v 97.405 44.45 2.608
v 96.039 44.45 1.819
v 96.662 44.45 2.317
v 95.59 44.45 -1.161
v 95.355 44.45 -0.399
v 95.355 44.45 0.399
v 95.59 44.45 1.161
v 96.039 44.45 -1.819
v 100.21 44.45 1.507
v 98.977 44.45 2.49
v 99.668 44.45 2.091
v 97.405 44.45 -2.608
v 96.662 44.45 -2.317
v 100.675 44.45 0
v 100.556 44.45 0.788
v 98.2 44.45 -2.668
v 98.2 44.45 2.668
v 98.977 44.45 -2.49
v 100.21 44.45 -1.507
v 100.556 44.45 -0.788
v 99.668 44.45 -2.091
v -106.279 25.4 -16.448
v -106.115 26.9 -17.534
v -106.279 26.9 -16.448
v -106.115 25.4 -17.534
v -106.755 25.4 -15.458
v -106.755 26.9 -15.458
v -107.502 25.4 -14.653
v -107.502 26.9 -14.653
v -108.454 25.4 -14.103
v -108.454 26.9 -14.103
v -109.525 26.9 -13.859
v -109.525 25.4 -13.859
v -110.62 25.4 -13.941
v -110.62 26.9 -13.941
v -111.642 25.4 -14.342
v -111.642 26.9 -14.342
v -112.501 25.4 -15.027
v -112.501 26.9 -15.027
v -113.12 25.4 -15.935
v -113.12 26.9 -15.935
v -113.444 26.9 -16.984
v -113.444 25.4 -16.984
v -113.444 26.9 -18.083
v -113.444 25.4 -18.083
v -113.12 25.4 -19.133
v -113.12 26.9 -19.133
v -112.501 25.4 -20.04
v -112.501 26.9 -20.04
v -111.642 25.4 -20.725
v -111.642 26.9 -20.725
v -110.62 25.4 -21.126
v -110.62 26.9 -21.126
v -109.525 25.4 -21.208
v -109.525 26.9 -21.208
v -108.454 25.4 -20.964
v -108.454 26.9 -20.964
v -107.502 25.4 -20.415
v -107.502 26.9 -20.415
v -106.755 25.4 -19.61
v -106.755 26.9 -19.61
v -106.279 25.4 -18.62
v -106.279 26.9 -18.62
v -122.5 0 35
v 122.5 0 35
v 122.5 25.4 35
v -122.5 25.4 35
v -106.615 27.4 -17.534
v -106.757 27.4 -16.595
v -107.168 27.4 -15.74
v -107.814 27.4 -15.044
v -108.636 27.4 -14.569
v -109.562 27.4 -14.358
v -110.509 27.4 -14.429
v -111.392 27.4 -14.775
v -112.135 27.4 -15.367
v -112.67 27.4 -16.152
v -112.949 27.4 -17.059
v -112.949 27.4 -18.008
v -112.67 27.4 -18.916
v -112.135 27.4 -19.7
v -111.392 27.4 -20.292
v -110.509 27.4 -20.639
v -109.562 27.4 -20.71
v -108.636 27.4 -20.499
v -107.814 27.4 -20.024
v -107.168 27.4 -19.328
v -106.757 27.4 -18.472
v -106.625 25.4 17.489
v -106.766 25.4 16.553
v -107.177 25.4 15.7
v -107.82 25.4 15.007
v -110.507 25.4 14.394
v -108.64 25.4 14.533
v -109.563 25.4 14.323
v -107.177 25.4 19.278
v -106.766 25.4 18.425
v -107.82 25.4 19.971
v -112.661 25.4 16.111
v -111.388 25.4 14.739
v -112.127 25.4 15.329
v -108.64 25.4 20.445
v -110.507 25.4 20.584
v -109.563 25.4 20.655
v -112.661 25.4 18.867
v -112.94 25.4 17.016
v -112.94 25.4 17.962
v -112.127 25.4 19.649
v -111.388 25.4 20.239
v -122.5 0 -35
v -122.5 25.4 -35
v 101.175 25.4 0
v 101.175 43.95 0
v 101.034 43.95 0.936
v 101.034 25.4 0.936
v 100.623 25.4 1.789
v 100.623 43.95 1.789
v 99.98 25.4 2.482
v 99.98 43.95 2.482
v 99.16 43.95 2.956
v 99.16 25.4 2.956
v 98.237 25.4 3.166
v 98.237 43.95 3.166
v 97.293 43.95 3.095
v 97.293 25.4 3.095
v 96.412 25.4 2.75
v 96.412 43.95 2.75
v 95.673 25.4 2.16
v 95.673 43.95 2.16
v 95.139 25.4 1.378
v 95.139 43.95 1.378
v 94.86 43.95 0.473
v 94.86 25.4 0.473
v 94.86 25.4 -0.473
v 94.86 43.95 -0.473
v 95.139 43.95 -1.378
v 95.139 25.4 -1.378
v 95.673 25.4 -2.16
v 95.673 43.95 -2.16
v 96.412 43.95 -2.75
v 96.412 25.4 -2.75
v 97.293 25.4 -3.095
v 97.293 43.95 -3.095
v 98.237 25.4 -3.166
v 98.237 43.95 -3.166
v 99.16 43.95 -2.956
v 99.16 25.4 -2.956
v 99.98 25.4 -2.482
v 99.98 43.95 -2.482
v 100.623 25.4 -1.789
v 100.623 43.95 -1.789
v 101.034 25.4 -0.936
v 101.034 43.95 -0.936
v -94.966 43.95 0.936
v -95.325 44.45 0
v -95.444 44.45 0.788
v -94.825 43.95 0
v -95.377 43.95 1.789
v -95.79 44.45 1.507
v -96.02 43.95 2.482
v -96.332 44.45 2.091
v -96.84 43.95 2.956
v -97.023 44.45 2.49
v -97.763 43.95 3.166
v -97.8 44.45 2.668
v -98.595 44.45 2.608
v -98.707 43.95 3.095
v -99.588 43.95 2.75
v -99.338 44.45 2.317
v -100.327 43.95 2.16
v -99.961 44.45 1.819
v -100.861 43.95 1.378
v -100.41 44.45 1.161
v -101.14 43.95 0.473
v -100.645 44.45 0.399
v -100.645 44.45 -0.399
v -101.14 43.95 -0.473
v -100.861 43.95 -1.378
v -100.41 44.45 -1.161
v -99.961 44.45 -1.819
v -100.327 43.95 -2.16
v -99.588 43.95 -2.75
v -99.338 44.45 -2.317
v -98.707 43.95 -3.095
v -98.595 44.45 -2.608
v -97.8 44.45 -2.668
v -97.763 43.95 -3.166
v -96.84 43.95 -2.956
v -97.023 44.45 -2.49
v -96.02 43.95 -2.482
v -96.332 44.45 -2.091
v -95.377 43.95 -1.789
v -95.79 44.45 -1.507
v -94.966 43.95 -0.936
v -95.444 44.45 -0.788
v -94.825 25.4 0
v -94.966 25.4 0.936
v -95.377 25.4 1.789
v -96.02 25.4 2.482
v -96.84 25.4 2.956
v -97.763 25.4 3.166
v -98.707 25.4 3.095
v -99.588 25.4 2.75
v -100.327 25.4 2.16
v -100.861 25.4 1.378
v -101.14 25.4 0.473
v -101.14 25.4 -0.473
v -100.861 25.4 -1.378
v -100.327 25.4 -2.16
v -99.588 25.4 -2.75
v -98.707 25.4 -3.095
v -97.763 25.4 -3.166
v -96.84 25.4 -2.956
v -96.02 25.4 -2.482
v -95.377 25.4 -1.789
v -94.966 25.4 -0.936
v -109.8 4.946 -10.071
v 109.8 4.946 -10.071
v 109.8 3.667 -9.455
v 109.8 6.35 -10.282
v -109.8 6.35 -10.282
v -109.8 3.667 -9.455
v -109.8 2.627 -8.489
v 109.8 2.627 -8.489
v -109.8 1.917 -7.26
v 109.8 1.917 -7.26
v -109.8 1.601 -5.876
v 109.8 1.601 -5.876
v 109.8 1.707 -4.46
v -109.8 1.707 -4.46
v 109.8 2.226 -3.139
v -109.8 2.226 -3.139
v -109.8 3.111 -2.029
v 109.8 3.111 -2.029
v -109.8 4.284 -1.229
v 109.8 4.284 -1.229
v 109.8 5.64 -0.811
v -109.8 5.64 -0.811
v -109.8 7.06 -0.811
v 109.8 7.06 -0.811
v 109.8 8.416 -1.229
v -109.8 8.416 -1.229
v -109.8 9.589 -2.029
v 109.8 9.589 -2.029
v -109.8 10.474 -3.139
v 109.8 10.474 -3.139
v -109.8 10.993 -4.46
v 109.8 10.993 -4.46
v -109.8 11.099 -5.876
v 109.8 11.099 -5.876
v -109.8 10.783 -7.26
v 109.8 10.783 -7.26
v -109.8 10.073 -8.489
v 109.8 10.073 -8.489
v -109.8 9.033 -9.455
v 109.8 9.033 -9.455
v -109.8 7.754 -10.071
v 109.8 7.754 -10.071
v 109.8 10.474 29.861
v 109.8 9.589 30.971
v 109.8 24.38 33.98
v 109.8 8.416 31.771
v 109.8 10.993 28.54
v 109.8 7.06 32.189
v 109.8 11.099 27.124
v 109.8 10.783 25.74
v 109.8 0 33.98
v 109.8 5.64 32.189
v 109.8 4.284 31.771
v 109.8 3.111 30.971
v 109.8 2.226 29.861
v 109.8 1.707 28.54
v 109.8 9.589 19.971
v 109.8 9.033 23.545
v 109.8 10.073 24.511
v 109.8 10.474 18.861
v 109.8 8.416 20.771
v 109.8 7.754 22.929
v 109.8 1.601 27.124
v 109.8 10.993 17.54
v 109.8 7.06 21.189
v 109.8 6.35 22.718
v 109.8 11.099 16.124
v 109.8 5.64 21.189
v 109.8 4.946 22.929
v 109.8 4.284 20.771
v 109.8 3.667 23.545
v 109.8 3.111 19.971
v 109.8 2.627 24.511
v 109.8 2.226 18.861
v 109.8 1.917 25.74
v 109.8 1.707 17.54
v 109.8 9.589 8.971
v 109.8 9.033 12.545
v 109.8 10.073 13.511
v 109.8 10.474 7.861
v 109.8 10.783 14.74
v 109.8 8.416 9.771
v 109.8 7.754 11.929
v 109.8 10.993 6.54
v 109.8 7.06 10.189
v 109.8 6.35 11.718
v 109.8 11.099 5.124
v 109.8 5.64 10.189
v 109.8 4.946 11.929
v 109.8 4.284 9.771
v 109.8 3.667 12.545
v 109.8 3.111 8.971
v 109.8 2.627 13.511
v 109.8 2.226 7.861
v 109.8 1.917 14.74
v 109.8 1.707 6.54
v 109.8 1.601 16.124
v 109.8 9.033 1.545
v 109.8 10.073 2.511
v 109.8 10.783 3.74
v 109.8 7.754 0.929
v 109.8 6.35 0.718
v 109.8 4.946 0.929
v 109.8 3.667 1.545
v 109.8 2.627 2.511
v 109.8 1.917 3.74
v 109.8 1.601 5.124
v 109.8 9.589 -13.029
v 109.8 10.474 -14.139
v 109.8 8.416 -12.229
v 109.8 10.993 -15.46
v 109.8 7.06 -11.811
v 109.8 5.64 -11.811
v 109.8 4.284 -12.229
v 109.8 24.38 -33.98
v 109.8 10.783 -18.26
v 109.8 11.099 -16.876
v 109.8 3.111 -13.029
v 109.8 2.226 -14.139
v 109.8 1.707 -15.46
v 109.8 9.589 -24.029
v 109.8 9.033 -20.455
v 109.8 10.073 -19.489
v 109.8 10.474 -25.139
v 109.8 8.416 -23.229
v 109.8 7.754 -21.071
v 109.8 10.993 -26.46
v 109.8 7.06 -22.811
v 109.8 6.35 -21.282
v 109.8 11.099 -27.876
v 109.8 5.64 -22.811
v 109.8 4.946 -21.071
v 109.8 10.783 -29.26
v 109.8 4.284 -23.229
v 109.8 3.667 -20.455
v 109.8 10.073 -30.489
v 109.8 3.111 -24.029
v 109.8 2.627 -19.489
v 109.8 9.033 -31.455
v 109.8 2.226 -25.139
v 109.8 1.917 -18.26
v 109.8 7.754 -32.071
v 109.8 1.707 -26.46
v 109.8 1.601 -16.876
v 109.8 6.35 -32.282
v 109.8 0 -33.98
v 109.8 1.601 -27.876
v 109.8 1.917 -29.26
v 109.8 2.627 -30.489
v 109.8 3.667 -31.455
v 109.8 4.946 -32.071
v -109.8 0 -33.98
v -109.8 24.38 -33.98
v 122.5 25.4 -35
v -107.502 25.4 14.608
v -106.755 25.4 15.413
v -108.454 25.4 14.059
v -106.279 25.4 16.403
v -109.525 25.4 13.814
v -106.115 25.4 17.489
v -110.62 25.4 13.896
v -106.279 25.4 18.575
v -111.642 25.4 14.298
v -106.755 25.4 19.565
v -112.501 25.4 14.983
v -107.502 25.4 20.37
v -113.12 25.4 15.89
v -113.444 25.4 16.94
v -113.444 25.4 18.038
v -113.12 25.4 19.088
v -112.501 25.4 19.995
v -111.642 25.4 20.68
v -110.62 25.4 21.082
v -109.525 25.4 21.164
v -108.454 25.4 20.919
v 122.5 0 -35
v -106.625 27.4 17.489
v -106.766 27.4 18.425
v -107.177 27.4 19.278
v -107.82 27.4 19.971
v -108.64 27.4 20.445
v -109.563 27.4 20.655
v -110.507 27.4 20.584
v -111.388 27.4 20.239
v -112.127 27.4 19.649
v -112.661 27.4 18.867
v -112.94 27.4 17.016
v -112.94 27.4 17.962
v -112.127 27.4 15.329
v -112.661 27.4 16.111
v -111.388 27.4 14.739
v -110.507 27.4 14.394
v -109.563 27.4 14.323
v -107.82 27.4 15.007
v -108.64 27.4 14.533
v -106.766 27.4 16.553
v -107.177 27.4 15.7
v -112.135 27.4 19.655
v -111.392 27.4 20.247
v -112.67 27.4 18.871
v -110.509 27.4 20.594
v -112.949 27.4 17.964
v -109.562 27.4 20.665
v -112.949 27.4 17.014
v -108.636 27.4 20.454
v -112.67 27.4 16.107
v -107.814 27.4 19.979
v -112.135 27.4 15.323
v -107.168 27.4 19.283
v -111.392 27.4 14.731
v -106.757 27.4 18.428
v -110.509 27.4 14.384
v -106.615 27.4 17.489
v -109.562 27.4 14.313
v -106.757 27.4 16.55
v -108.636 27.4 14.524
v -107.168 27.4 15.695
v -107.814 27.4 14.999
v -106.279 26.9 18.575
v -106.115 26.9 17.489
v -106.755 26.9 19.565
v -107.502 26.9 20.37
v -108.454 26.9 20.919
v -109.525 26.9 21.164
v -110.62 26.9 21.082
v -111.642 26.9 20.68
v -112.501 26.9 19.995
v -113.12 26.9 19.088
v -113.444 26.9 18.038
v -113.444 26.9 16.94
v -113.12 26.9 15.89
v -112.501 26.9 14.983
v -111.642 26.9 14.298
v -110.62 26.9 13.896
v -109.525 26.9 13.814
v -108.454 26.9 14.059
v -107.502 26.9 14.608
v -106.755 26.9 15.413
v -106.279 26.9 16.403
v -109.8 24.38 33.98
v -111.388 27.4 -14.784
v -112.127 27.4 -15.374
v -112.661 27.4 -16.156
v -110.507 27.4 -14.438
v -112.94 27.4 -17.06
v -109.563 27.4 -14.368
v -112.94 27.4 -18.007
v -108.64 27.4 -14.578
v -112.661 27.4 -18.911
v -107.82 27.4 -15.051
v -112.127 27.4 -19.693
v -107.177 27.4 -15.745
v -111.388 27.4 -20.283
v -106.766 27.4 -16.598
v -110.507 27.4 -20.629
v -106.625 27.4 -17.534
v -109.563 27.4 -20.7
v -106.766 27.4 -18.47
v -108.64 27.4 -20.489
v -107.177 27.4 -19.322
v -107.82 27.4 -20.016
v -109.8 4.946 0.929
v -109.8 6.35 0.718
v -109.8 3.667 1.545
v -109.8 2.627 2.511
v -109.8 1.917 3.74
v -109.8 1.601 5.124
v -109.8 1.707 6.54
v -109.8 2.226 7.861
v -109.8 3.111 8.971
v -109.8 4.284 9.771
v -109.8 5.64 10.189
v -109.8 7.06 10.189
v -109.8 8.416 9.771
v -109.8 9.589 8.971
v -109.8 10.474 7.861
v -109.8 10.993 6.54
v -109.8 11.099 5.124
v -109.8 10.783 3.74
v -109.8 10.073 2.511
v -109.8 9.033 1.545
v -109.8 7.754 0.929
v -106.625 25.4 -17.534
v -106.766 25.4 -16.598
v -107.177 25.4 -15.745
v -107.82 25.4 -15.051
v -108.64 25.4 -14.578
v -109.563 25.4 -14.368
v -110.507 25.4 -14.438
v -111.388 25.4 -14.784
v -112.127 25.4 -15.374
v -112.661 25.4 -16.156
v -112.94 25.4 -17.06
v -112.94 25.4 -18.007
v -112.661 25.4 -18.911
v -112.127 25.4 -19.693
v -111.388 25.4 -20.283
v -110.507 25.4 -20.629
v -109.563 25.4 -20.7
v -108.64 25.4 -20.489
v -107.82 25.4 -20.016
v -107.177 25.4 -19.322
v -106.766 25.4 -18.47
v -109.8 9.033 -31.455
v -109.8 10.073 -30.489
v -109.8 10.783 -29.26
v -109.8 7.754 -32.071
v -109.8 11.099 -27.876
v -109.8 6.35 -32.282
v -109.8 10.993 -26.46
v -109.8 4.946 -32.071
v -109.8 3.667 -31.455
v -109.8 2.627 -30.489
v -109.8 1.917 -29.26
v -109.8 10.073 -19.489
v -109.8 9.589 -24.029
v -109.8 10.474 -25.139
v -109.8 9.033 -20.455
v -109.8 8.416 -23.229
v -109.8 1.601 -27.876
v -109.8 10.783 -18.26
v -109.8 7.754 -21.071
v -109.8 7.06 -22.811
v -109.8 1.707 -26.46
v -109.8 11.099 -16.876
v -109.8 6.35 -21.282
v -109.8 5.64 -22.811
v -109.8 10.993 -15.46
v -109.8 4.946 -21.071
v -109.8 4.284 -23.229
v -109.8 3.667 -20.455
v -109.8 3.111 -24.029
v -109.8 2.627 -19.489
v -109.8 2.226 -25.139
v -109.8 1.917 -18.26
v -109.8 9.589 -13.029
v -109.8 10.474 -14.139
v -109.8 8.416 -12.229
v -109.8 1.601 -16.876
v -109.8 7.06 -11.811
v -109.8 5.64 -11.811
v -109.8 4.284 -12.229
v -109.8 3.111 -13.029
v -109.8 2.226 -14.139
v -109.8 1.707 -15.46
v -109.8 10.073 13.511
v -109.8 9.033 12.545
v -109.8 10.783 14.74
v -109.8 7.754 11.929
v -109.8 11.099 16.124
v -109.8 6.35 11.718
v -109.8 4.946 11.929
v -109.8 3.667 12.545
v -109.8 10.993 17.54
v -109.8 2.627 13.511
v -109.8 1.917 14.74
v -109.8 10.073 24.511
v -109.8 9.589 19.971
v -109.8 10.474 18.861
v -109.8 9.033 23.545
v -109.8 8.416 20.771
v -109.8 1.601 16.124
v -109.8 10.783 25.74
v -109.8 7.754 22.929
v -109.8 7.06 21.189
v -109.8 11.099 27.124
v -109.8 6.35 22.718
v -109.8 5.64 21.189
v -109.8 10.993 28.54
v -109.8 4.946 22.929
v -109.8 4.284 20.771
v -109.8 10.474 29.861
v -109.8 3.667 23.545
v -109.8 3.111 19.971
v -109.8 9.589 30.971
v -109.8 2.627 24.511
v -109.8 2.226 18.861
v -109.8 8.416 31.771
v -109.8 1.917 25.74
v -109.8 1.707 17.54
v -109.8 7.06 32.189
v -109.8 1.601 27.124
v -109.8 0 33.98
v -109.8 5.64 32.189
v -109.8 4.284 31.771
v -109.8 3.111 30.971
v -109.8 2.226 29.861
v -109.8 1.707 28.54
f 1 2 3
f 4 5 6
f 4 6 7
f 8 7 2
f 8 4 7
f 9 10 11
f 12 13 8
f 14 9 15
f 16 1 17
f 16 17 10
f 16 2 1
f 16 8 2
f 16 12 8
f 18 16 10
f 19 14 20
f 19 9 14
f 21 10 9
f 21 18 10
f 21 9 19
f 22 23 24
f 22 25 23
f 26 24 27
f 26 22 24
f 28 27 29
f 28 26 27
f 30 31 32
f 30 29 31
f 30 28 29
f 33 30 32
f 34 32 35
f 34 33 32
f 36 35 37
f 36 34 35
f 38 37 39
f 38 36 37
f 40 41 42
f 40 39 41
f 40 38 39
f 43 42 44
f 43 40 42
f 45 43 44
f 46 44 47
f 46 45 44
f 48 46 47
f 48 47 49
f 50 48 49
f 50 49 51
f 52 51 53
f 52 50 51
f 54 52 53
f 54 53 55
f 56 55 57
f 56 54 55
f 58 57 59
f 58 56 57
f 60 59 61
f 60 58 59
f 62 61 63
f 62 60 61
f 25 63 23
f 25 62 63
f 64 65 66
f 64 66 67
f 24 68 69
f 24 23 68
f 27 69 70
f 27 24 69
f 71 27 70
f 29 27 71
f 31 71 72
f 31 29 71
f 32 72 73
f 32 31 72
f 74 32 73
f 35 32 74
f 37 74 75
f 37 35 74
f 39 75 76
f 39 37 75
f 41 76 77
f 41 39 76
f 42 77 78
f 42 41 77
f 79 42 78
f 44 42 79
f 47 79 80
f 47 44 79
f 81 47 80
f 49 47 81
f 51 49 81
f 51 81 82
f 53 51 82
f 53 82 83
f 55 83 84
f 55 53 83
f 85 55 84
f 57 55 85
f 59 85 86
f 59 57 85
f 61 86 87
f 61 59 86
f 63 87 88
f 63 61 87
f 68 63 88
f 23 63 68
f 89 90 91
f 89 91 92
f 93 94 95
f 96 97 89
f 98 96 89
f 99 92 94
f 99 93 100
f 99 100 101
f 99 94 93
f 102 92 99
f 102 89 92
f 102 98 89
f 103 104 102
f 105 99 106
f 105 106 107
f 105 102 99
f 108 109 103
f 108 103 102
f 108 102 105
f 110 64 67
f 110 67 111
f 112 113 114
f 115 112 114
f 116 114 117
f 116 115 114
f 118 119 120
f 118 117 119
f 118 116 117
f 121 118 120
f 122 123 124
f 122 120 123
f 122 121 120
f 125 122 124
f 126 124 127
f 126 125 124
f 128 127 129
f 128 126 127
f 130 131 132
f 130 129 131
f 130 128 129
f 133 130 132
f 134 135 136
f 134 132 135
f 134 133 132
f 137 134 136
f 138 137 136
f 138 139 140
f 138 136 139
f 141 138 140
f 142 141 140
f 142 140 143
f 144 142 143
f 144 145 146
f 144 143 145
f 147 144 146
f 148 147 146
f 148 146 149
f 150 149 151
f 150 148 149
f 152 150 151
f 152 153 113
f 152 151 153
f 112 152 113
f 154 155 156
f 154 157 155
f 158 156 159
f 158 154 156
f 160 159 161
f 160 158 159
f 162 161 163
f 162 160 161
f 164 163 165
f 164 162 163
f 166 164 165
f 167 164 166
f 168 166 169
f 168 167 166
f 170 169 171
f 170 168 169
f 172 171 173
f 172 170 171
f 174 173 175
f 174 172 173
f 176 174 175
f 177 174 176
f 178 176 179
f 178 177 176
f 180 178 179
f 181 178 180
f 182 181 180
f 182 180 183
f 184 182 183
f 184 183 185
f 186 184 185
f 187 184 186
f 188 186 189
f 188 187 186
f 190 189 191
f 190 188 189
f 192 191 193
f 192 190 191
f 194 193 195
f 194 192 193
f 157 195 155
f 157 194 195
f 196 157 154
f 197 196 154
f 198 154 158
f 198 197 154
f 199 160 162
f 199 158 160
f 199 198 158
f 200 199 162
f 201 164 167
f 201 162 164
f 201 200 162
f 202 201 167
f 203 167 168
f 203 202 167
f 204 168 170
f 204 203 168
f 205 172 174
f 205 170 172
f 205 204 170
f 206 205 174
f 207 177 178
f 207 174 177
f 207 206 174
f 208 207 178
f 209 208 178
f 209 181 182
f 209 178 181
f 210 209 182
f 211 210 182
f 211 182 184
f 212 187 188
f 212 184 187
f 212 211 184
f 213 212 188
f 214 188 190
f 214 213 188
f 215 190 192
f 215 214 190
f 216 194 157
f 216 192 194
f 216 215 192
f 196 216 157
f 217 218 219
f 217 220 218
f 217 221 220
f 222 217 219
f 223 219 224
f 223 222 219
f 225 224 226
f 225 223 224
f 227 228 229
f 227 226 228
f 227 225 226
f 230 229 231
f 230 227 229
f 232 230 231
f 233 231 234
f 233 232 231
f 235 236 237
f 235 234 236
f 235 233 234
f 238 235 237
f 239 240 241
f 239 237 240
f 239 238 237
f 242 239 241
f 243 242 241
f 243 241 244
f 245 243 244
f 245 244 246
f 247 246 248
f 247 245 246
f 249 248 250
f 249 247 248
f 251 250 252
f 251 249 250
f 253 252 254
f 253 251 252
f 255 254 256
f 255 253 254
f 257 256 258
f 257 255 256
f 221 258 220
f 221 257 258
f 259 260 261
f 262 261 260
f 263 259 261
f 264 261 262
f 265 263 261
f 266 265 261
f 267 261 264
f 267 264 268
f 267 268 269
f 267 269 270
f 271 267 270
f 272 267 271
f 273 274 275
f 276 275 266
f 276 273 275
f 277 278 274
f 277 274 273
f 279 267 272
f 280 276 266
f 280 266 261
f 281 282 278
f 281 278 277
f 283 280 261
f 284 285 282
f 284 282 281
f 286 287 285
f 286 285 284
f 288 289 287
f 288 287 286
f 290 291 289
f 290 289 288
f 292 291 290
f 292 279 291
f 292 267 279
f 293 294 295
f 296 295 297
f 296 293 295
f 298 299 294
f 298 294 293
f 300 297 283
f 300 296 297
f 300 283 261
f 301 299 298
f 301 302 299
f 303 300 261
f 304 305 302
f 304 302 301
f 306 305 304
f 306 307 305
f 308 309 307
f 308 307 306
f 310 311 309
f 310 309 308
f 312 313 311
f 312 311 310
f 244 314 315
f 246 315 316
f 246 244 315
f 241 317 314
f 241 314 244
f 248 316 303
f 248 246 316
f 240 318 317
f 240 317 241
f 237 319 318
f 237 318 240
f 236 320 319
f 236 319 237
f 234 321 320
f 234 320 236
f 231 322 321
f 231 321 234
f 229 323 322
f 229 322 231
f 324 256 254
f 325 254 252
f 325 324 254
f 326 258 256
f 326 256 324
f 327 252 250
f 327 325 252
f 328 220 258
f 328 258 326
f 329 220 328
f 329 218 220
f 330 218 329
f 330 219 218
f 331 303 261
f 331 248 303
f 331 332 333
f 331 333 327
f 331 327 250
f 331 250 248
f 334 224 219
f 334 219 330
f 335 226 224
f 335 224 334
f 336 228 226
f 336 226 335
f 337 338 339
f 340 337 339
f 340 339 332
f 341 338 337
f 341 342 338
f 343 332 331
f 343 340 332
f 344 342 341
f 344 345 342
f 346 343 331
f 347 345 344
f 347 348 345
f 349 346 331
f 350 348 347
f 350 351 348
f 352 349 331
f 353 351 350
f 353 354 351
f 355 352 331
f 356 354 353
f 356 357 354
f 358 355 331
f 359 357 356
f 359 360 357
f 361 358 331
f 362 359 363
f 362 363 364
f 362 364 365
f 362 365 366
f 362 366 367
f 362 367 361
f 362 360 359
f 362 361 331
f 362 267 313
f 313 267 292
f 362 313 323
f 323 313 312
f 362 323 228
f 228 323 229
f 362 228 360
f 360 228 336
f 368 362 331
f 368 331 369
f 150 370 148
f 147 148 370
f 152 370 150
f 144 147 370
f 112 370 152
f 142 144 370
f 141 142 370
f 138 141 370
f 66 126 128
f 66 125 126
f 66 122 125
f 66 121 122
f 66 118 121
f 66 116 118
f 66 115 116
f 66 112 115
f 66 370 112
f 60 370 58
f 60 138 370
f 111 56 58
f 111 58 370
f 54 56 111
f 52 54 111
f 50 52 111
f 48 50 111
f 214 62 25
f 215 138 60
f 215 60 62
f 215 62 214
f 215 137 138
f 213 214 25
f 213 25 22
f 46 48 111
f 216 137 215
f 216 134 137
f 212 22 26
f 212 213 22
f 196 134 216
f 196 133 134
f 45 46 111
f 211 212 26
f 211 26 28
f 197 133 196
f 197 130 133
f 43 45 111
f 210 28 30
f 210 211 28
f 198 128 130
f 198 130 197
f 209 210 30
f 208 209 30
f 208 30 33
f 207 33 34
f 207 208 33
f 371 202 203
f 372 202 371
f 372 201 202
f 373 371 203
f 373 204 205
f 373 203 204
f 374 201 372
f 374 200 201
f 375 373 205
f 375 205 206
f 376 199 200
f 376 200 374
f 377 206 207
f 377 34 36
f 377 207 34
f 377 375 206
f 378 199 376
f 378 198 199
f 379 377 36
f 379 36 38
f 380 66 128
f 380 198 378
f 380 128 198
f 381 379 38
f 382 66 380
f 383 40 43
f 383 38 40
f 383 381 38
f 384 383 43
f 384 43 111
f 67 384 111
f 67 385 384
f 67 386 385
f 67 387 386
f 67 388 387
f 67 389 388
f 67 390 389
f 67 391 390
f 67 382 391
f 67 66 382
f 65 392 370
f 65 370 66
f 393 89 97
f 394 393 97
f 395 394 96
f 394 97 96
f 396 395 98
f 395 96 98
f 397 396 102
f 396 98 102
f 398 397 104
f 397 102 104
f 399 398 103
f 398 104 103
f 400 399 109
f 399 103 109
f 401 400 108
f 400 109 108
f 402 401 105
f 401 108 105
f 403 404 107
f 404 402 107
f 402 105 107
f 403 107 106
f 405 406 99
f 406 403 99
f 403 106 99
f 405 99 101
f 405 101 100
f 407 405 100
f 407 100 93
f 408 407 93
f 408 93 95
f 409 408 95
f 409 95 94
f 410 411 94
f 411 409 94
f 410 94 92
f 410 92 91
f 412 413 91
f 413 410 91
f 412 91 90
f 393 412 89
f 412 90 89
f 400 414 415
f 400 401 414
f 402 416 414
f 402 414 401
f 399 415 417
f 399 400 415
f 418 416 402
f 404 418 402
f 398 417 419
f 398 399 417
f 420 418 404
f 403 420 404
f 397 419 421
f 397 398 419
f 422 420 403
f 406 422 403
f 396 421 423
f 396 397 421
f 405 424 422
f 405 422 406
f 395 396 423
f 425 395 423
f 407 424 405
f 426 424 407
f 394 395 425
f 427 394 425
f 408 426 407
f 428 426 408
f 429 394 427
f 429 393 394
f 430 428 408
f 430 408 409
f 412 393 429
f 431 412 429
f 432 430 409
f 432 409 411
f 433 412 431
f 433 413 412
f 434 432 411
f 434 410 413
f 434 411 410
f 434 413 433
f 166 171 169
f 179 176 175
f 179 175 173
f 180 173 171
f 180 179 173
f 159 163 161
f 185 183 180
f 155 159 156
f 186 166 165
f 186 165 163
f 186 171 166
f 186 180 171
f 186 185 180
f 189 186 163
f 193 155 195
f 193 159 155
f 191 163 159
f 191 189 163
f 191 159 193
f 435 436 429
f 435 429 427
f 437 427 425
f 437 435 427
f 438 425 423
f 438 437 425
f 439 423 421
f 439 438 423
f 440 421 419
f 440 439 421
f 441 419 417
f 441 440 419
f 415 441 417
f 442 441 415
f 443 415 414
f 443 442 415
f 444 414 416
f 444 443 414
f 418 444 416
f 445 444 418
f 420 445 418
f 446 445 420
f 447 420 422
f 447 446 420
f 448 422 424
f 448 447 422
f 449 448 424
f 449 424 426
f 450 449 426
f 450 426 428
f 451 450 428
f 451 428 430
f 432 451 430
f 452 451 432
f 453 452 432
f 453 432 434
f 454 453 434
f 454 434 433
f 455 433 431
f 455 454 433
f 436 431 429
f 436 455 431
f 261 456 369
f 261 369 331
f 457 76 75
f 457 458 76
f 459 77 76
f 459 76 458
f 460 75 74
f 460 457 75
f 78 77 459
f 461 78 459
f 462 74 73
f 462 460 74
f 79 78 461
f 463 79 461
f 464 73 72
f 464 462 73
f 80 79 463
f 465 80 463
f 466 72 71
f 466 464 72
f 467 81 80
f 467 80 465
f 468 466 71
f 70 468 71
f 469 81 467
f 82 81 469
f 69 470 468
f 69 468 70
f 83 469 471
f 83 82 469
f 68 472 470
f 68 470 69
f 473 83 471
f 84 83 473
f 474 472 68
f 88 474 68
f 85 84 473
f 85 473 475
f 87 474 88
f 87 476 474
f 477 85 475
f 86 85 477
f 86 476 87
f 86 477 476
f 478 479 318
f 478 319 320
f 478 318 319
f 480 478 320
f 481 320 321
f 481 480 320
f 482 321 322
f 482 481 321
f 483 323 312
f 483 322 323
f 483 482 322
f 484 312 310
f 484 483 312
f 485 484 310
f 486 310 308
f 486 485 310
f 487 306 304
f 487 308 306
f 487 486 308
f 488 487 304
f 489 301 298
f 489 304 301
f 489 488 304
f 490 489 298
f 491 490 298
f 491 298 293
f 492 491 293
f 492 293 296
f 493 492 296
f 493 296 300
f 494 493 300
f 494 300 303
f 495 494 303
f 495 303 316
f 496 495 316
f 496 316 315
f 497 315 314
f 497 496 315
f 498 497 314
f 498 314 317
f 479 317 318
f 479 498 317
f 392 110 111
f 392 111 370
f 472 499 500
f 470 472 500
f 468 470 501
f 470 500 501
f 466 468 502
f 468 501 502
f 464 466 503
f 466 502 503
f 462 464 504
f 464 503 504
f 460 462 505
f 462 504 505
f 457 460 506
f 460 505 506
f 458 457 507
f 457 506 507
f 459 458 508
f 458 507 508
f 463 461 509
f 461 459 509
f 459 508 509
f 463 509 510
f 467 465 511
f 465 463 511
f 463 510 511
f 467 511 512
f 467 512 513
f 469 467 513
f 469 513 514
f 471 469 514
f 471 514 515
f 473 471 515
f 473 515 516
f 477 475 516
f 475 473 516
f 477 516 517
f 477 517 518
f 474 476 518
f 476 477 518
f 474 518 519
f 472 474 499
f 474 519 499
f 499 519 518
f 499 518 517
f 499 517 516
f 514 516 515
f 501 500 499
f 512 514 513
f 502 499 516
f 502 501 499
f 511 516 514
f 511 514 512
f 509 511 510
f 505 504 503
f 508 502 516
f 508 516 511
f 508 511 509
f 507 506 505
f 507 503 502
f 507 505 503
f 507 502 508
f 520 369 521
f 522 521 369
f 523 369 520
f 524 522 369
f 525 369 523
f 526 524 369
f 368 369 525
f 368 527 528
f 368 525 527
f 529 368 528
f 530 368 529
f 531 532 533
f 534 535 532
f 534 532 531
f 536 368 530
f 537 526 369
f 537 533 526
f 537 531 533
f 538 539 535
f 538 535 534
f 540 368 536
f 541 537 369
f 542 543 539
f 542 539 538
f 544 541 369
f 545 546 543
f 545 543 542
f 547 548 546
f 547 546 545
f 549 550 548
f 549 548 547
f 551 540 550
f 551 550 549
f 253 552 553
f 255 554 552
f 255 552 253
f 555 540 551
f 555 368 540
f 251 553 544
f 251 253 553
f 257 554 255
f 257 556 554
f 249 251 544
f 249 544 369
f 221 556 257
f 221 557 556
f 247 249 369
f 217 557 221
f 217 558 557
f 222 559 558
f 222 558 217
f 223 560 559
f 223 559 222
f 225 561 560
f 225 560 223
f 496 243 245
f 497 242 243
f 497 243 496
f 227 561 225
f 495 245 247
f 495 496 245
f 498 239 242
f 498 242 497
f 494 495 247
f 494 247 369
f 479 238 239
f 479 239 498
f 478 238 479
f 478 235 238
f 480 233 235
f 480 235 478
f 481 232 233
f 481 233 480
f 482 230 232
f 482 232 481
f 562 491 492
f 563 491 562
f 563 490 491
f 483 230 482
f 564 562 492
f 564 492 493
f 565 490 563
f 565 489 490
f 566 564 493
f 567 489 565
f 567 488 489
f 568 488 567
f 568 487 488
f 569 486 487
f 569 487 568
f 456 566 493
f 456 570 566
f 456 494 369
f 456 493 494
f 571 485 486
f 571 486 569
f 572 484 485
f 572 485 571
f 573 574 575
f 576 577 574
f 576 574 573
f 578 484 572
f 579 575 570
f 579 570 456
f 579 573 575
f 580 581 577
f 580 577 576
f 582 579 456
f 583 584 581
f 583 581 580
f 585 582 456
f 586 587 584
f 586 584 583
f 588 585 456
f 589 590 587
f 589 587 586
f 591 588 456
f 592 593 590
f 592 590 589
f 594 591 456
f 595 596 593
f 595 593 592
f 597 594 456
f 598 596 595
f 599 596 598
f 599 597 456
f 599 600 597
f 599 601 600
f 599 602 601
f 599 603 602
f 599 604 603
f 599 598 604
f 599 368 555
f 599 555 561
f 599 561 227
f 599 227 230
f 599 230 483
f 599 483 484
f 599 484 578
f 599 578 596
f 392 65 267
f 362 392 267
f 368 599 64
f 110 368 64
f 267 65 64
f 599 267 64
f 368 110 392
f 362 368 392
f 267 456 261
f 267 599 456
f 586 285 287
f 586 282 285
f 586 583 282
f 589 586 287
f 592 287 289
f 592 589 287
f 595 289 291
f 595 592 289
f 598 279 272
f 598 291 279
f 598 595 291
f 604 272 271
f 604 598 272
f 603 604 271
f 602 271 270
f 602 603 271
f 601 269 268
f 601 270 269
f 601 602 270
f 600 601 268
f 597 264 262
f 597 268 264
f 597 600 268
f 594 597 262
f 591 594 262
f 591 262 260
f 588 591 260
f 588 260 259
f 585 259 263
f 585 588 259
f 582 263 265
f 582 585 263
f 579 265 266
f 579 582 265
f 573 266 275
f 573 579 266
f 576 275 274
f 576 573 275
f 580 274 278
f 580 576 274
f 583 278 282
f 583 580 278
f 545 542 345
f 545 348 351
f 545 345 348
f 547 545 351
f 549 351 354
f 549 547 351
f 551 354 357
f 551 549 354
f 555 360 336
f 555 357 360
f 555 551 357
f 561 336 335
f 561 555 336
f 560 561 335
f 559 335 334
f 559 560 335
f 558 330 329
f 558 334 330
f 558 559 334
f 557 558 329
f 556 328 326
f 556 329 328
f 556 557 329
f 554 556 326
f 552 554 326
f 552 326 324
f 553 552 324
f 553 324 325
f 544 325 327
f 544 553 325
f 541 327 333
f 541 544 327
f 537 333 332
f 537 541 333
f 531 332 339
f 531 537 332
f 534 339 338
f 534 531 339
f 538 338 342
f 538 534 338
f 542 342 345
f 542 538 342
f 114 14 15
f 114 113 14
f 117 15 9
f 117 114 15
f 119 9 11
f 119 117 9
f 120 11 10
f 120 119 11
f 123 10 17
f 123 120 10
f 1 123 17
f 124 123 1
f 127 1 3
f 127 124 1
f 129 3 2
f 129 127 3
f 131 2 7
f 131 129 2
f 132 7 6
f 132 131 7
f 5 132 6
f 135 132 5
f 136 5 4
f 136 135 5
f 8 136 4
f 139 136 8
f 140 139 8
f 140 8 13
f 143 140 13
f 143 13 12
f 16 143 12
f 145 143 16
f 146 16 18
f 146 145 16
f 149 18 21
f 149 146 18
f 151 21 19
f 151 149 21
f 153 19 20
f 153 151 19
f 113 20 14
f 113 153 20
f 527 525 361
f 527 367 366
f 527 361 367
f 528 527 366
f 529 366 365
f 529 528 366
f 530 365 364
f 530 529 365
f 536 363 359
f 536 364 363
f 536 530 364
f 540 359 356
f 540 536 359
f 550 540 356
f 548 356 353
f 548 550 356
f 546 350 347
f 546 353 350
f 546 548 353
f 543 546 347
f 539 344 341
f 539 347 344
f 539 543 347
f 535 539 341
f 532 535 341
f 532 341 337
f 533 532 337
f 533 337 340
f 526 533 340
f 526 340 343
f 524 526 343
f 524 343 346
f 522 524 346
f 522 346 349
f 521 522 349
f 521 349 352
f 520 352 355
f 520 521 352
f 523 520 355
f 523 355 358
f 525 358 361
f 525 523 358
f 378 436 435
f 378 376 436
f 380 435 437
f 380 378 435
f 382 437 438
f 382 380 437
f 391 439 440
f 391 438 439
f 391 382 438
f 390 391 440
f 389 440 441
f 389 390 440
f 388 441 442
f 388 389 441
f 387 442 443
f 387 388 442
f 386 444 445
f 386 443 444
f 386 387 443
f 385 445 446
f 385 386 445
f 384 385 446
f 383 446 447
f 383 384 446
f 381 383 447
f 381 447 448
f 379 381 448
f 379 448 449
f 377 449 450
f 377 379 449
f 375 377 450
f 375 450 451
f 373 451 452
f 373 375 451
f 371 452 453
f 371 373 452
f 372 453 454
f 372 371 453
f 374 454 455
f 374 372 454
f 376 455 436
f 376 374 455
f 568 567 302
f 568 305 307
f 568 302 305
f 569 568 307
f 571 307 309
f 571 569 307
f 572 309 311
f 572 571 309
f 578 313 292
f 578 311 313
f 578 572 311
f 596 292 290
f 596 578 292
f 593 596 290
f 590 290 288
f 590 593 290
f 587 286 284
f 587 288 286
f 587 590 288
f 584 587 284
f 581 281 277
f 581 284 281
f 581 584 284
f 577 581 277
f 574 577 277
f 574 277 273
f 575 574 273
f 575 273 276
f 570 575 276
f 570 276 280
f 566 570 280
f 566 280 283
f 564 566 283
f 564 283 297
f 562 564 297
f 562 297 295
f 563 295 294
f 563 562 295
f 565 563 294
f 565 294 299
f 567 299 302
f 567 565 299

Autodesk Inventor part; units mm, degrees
ref_plane "YZ Plane" through (0, 0, 0) normal (1, 0, 0) x (0, 1, 0)
ref_plane "XZ Plane" through (0, 0, 0) normal (0, 1, 0) x (-1, 0, 0)
ref_plane "XY Plane" through (0, 0, 0) normal (0, 0, 1) x (1, 0, 0)
sketch "Boceto1" plane through (0, 0, 0) normal (0, 1, 0) x (-1, 0, 0)
  line L0 (-122.5, 35) -> (122.5, 35)
  line L1 (122.5, 35) -> (122.5, -35)
  line L2 (122.5, -35) -> (-122.5, -35)
  line L3 (-122.5, -35) -> (-122.5, 35)
  line L4 (-122.5, 35) -> (122.5, -35) construction
  line L5 (122.5, 35) -> (-122.5, -35) construction
  point P0 (0, 0)
  dimension "d0" = 245
  dimension "d1" = 70
extrude "Extrusión1" add sketch "Boceto1" along normal blind 25.4
sketch "Boceto2" plane through (0, 0, 0) normal (0, -1, 0) x (1, 0, 0)
  line L0 (-109.8, 33.98) -> (109.8, 33.98)
  line L1 (109.8, -33.98) -> (-109.8, -33.98)
  line L2 (-109.8, -33.98) -> (-109.8, 33.98)
  line L3 (109.8, 33.98) -> (109.8, -33.98)
  line L4 (-122.5, -35) -> (-122.5, 35) projected
  line L5 (-122.5, 35) -> (122.5, 35) projected
  dimension "d8" = 12.7
  dimension "d9" = 1.02
extrude "Extrusión2" cut sketch "Boceto2" against normal blind 24.38
sketch "Boceto3" plane through (-109.8, 0, 33.98) normal (1, 0, 0) x (0, 0, -1)
  line L0 (-1.02, 0) -> (-1.02, 25.4) construction
  line L1 (68.98, 0) -> (68.98, 25.4) construction
  circle A0 centre (6.5, 6.35) radius 4.7625
  line L2 (0, 0) -> (0, 24.38) projected
  line L3 (67.96, 0) -> (0, 0) projected
  circle A1 centre (17.5, 6.35) radius 4.7625
  circle A2 centre (28.5, 6.35) radius 4.7625
  circle A3 centre (39.5, 6.35) radius 4.7625
  circle A4 centre (50.5, 6.35) radius 4.7625
  circle A5 centre (61.5, 6.35) radius 4.7625
  point P0 (33.98, 0)
  dimension "d12" = 9.525
  dimension "d13" = 6.5
  dimension "d14" = 6.35
  dimension "d17" = 11
extrude "Extrusión3" add sketch "Boceto3" along normal up to surface (219.6 mm away)
sketch "Boceto4" plane through (0, 25.4, 0) normal (0, 1, 0) x (1, 0, 0)
  line L0 (-122.5, 35) -> (-73.5, 35) construction
  line L1 (-73.5, 35) -> (-73.5, -35) construction
  line L2 (-122.5, -35) -> (122.5, -35) construction
  line L3 (-122.5, -35) -> (-73.5, 35) construction
  line L4 (-122.5, 35) -> (-73.5, -35) construction
  line L5 (122.5, 35) -> (-122.5, 35) construction
  line L6 (122.5, 35) -> (73.5, 35) construction
  line L7 (73.5, 35) -> (73.5, -35) construction
  line L8 (73.5, -35) -> (122.5, 35) construction
  line L9 (73.5, 35) -> (122.5, -35) construction
  circle A0 centre (-98, 0) radius 3.175
  circle A1 centre (98, 0) radius 3.175
  point P0 (0, 0)
  dimension "d24" = 49
  dimension "d25" = 49
  dimension "d26" = 6.35
  dimension "d27" = 6.35
extrude "Extrusión4" add sketch "Boceto4" along normal blind 19.05
thread "Rosca1" size "1/4-20 UNC" class "1A" standard "ANSI Unified Screw Threads" full length
thread "Rosca2" size "M7x1" class "6g" standard "ANSI Metric M Profile" full length
chamfer "Chaflán1" distance 0.5 angle 45 1 edges at (-101.175, 44.45, 0)
chamfer "Chaflán2" distance 0.5 angle 45 1 edges at (94.825, 44.45, 0)
sketch "Boceto5" plane through (0, 25.4, 0) normal (0, 1, 0) x (1, 0, 0)
  line L0 (-122.5, -35) -> (122.5, -35) construction
  line L1 (-109.8, -35) -> (-109.8, 35.0447) construction
  line L2 (-122.5, 35) -> (-122.5, -35) construction
  line L3 (-109.8, -35) -> (-109.8, -17.489) construction
  line L4 (-109.8, -11.7175) -> (-109.8, -21.2425) construction
  line L5 (-109.8, 35.0447) -> (-109.8, 17.5337) construction
  line L6 (-109.8, 33.98) -> (-109.8, -33.98) construction
  circle A0 centre (-109.8, -17.489) radius 3.175
  circle A1 centre (-109.8, 17.5337) radius 3.175
  circle A2 centre (-109.8, -17.489) radius 3.685
  circle A3 centre (-109.8, 17.5337) radius 3.685
  point P0 (0, 0)
  dimension "d40" = 12.7
  dimension "d41" = 17.511
  dimension "d42" = 17.511
  dimension "d43" = 6.35
  dimension "d44" = 6.35
  dimension "d45" = 7.37
  dimension "d46" = 7.37
extrude "Extrusión5" add sketch "Boceto5" along normal blind 2
chamfer "Chaflán3" distance 0.5 angle 45 2 edges at (-113.485, 27.4, -17.5337) (-113.485, 27.4, 17.489)
sketch "Boceto6" plane through (-109.8, 25.4, 17.489) normal (0, 1, 0) x (1, 0, 0)
  circle A0 centre (0, 0) radius 3.175 projected
sketch "Boceto7" plane through (-109.8, 25.4, -17.5337) normal (0, 1, 0) x (1, 0, 0)
  circle A0 centre (0, 0) radius 3.175 projected
properties part number "resistencia_cuarzo_250-300W"
